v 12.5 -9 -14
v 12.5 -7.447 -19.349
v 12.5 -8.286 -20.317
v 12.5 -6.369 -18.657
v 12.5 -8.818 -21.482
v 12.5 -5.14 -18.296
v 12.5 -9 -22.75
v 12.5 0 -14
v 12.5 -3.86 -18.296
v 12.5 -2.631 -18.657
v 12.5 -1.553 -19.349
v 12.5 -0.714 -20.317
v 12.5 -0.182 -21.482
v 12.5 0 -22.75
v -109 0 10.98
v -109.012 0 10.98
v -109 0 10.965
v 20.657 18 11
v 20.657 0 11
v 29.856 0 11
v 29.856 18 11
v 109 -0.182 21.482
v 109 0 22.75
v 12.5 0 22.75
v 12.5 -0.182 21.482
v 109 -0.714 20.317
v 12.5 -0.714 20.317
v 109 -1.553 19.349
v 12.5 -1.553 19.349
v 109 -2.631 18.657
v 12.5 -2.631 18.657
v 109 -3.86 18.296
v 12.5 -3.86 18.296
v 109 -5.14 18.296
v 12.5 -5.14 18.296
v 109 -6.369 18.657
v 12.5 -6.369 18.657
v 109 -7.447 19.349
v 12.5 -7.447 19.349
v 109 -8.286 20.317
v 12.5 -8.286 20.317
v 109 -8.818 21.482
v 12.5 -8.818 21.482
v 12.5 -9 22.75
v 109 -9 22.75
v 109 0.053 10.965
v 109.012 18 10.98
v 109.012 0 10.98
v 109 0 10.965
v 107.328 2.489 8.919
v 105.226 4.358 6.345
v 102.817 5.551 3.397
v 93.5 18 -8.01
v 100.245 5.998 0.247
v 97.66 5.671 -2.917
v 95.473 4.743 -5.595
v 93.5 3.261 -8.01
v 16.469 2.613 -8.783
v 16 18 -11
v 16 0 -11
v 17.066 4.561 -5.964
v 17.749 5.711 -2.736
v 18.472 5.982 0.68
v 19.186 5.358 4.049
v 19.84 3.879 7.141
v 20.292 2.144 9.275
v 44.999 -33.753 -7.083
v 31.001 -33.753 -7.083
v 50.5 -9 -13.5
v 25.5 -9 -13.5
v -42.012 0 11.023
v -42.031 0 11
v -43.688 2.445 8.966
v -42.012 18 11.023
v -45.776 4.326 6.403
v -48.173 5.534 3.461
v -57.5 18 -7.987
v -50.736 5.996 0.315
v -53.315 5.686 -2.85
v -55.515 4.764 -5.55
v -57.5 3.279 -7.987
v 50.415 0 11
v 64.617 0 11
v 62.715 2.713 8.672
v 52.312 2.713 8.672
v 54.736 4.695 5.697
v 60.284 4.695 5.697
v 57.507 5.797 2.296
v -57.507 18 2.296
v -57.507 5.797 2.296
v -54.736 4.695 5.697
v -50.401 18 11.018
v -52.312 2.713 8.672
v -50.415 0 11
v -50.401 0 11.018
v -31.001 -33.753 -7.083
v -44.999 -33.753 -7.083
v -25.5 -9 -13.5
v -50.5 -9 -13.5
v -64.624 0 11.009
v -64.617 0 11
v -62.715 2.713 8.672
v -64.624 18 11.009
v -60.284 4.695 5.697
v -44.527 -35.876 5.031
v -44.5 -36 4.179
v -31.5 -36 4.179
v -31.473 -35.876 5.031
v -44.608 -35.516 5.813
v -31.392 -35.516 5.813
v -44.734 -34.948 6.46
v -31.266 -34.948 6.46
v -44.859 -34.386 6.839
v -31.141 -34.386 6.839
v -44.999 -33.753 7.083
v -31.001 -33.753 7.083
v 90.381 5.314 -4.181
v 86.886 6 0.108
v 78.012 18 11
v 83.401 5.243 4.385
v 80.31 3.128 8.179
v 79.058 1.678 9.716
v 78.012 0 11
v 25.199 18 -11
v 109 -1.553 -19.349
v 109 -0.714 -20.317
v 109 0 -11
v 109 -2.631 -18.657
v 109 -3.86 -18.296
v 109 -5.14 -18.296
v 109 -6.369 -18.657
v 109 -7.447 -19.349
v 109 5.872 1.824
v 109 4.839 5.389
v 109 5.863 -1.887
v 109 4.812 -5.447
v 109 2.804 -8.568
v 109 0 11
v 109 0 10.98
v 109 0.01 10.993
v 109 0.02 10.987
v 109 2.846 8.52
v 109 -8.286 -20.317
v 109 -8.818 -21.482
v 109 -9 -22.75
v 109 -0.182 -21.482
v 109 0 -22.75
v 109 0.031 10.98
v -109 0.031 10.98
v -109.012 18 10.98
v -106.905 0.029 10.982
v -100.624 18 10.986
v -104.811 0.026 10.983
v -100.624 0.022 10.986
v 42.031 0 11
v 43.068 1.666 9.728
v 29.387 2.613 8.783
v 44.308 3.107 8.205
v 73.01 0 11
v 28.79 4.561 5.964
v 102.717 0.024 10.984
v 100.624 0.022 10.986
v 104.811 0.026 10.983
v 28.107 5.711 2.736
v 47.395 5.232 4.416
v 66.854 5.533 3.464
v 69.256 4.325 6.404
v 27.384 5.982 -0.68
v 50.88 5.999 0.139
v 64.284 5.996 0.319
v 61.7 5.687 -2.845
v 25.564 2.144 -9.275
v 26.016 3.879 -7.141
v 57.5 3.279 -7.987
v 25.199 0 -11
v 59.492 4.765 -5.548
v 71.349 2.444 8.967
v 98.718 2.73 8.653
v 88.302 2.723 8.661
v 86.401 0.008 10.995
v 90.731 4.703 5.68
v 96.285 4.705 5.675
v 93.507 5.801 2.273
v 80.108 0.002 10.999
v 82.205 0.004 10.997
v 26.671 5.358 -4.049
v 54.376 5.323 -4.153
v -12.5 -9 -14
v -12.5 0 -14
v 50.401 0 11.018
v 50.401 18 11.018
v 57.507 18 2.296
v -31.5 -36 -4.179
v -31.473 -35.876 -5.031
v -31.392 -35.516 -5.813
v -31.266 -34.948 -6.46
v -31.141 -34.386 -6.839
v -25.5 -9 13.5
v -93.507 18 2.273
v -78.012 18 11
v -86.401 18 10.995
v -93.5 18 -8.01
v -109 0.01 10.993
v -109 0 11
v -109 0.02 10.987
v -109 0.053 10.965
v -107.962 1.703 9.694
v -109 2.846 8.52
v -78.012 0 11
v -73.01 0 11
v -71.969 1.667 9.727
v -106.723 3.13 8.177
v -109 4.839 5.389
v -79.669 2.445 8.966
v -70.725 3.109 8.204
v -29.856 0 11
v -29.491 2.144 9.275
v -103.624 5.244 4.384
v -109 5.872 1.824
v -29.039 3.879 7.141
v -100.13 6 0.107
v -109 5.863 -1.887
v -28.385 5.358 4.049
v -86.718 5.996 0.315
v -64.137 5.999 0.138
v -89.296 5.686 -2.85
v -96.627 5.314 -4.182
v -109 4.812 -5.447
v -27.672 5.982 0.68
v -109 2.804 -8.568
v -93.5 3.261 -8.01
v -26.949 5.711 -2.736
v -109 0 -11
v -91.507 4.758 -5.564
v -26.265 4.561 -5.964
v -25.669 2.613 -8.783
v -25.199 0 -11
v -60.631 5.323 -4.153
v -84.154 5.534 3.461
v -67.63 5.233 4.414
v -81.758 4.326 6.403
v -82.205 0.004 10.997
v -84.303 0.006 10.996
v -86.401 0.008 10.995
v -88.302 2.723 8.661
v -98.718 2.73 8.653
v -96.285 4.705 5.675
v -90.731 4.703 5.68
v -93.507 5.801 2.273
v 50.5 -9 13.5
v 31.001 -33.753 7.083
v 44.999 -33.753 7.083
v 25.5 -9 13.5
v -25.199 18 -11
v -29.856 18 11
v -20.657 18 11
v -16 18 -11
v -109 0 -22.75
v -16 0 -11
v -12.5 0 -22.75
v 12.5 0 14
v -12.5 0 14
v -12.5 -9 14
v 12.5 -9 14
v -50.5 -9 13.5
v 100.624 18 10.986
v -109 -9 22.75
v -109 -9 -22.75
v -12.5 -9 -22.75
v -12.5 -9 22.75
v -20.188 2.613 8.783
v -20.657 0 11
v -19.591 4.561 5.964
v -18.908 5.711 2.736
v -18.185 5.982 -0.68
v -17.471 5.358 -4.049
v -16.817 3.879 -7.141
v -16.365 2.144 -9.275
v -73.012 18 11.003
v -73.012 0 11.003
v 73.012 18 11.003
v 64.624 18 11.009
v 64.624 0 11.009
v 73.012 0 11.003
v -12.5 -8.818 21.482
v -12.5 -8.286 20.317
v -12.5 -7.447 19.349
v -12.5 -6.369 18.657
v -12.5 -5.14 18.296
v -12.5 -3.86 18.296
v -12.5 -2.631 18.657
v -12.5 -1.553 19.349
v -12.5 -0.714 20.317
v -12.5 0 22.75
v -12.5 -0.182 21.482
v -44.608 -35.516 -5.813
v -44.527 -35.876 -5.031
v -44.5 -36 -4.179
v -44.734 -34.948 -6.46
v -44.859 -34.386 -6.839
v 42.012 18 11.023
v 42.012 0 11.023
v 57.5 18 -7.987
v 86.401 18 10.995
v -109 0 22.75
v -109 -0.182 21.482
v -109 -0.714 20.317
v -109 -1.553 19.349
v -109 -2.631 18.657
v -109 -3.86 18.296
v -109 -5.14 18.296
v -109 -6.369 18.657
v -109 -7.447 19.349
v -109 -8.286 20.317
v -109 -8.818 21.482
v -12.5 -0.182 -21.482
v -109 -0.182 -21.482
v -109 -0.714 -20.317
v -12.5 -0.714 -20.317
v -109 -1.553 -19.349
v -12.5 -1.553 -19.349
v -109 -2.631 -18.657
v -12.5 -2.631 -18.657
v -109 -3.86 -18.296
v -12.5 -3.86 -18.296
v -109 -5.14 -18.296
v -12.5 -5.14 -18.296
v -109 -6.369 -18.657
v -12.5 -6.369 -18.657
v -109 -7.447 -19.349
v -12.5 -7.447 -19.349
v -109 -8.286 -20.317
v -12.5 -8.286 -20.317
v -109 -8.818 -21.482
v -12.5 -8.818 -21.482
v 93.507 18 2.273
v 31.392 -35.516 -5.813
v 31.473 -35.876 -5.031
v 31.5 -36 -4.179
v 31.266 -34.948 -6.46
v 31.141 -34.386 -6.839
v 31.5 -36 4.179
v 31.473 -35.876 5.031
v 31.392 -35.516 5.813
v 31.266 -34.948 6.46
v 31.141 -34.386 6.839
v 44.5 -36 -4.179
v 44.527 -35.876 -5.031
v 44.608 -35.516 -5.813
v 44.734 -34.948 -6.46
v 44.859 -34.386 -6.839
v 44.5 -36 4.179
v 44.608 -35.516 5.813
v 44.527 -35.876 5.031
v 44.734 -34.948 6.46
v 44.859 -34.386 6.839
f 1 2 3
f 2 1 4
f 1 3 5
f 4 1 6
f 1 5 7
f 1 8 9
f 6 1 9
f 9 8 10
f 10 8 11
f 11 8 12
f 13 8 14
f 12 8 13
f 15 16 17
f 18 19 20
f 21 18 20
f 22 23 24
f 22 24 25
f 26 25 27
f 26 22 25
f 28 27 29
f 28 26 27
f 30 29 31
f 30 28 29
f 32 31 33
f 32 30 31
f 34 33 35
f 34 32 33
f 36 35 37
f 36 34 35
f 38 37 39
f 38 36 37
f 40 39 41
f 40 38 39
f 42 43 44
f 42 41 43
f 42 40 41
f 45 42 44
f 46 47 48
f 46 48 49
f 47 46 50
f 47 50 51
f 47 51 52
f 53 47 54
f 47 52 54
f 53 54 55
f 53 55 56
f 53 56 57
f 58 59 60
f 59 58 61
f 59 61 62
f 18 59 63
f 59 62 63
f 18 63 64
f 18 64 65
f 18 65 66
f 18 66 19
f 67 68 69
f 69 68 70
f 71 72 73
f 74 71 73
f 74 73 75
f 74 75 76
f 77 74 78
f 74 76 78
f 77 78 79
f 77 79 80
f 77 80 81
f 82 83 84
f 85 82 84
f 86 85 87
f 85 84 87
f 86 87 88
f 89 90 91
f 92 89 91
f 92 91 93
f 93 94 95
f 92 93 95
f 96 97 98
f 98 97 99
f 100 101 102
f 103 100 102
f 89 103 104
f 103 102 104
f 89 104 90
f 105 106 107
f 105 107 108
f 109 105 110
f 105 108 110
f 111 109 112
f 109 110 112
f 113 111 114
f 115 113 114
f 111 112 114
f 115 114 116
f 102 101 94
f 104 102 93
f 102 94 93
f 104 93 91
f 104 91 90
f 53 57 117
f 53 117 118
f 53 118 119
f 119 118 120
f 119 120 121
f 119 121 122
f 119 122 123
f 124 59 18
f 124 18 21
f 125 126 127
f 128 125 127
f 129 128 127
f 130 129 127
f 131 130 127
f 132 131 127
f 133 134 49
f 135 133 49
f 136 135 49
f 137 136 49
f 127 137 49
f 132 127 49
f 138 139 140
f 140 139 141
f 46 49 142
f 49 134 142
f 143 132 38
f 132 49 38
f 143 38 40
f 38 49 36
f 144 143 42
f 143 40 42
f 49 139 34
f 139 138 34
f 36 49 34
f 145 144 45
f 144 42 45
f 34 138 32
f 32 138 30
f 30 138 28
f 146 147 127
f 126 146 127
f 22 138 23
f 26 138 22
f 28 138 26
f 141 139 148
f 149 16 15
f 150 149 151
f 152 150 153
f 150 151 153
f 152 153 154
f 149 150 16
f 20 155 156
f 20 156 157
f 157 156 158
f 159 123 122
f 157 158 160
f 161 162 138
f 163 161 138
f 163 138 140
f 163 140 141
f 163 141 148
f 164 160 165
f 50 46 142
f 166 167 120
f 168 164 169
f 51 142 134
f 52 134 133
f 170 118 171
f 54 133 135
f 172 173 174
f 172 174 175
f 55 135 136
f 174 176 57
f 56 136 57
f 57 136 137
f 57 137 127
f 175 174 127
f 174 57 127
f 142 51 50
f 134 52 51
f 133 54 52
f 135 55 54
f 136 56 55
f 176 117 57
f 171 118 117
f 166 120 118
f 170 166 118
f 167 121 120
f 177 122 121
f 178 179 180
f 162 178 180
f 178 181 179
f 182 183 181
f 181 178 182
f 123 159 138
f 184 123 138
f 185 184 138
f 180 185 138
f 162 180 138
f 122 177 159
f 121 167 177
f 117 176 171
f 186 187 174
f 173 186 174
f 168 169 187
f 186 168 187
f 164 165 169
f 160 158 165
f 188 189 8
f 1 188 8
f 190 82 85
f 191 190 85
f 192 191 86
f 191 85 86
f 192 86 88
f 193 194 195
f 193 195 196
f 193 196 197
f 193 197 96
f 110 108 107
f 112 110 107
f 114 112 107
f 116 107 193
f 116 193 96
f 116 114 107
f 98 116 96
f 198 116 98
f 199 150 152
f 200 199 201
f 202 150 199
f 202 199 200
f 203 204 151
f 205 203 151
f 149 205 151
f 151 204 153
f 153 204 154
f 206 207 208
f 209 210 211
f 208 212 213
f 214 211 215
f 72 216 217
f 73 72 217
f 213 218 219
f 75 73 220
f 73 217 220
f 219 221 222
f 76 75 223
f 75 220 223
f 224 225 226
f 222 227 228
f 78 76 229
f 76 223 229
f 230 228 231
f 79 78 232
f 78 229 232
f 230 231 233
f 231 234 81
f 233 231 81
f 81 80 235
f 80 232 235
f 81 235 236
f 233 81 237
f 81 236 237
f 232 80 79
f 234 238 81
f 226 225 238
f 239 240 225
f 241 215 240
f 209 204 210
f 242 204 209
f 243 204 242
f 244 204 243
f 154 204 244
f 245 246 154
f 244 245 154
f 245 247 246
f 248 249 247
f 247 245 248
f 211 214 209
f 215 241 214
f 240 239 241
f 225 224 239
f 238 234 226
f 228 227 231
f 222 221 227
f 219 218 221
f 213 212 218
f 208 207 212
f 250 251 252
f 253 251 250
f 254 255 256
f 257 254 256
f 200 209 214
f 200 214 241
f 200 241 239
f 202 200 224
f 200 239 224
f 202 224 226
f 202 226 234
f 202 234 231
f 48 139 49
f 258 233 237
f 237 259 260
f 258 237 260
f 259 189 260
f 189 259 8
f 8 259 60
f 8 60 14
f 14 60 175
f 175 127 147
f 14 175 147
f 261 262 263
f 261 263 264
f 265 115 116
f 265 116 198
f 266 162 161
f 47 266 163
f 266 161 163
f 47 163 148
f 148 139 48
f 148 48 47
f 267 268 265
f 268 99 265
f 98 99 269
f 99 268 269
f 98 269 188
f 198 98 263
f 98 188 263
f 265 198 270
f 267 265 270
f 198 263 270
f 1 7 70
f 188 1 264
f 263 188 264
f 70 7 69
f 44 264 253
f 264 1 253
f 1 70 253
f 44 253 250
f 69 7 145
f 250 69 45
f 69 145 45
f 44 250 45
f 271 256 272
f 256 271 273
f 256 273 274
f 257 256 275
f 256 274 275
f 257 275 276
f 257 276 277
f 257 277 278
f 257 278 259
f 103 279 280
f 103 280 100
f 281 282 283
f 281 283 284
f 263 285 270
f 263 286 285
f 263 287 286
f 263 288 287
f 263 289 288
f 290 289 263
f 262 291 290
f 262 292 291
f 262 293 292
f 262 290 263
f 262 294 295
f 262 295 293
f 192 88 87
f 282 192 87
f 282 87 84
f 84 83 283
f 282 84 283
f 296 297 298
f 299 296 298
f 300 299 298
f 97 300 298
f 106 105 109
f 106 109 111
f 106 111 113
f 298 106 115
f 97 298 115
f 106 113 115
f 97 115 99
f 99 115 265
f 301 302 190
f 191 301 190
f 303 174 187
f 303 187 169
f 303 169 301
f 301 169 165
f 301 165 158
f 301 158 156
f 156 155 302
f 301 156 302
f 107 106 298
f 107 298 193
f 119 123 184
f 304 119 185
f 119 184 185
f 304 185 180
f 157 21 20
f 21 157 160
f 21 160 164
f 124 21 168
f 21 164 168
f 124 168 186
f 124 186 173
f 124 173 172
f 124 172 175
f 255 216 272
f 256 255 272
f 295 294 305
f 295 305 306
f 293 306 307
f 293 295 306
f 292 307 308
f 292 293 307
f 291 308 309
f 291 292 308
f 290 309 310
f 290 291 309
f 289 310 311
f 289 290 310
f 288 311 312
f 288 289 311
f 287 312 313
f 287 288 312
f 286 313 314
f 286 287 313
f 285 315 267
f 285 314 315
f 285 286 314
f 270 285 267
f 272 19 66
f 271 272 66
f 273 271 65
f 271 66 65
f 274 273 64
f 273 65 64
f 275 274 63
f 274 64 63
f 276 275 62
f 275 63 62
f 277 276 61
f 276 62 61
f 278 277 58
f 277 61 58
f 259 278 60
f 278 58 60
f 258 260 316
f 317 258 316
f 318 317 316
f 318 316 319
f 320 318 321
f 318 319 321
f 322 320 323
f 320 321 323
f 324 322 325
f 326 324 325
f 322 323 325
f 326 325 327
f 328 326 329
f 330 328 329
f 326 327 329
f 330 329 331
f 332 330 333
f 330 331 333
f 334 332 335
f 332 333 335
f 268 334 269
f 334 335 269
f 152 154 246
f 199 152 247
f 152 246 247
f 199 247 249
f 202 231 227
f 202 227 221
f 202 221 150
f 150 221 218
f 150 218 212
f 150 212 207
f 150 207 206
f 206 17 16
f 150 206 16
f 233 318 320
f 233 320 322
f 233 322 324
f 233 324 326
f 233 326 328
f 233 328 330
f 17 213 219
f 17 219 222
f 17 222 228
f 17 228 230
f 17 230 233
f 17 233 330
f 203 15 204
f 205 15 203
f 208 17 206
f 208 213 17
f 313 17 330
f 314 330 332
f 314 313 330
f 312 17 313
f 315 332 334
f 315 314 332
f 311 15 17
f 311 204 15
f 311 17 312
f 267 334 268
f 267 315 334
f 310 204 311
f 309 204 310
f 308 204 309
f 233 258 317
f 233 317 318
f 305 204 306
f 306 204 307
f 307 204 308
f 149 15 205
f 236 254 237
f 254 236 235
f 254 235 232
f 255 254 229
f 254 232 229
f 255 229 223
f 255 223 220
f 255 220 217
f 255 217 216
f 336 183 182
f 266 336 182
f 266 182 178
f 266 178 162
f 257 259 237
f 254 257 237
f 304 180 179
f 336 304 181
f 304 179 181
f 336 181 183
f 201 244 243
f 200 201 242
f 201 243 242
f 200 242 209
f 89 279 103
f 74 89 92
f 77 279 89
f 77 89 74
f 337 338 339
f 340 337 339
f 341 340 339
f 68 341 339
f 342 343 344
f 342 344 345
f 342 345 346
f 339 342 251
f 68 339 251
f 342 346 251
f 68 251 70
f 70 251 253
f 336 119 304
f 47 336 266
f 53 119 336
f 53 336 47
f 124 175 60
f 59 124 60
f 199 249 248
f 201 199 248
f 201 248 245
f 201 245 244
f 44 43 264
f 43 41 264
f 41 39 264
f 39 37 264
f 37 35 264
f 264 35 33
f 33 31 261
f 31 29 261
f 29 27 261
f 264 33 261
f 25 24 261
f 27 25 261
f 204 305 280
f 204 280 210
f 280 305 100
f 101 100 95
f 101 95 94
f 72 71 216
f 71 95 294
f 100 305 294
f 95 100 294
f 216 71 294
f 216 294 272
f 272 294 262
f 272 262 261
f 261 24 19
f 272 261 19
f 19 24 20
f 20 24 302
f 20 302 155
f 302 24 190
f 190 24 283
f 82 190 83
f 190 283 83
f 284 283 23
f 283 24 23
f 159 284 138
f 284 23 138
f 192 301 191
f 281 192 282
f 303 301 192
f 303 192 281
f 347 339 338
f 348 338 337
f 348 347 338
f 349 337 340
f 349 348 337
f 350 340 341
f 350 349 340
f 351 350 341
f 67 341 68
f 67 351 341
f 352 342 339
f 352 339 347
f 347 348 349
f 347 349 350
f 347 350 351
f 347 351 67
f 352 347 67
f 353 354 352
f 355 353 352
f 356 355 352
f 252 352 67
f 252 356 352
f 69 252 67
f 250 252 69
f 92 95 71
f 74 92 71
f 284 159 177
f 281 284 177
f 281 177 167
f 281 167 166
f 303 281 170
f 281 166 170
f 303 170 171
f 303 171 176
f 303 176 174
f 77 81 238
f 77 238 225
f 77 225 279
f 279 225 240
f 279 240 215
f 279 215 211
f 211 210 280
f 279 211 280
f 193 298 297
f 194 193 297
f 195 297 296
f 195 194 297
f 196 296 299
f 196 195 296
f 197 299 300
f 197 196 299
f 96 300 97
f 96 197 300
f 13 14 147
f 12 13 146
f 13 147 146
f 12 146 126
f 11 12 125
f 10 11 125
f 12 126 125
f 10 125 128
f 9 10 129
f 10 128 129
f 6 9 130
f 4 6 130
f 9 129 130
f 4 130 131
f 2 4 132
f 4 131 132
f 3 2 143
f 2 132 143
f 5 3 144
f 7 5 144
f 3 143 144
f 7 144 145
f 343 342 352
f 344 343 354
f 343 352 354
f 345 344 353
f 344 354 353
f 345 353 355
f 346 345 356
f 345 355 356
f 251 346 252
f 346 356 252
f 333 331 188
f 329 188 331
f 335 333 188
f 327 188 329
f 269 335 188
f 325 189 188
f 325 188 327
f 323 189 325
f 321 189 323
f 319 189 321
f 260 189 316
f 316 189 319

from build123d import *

# Parameters (mm, degrees)
EXTRUDE_1_DEPTH     = 109
EXTRUDE_2_DEPTH     = 18
SKETCH_3_W          = 25
SKETCH_3_H          = 11.25
CUT_EXTRUDE_1_DEPTH = 18
SKETCH_4_W          = 25
SKETCH_4_H          = 27
EXTRUDE_3_DEPTH     = 27
CUT_EXTRUDE_2_DEPTH = 122.166018853
CUT_EXTRUDE_3_DEPTH = 166.462013552
FILLET_1_R          = 3
CUT_EXTRUDE_4_DEPTH = 223.40244064


# Read off the part's stored shape, not the designer's step: Бобышка-Вытянуть2
with BuildPart() as part:
    # Эскиз1 → Бобышка-Вытянуть1 (new, symmetric)
    with BuildSketch(Plane(origin=(0, 0, 0), x_dir=(0, 0, -1), z_dir=(1, 0, 0))):
        with BuildLine():
            Line((11, 0), (25.25, 0))
            Line((25.25, 0), (25.25, -9))
            Line((25.25, -9), (-25.25, -9))
            Line((-25.25, -9), (-25.25, 0))
            Line((-25.25, 0), (-11, 0))
            ThreePointArc((-11, 0), (0, 6), (11, 0))
        make_face()
    extrude(amount=EXTRUDE_1_DEPTH, both=True)

    # Бобышка-Вытянуть2 outline → Бобышка-Вытянуть2 (add)
    with BuildSketch(Plane(origin=(0, 0, 0), x_dir=(1, 0, 0), z_dir=(0, 1, 0))):
        Polygon((16, 11), (20.656976684, -11), (29.856406461, -11), (25.199429777, 11), align=None)
        Polygon((-29.856406461, -11), (-20.656976684, -11), (-16, 11), (-25.199429777, 11), align=None)
        Polygon((78.012123179, -10.999996132), (86.400679256, -10.994643711), (93.506557878, -2.272856192), (100.623560797, -10.985568626), (109.012116871, -10.980216204), (93.499996845, 8.009889964), align=None)
        Polygon((64.623554487, -11.008538874), (73.012110561, -11.003186452), (57.499990534, 7.986919716), (42.012116871, -11.02296638), (50.400672946, -11.017613959), (57.506551567, -2.29582644), align=None)
        Polygon((-109.012116871, -10.980216204), (-100.623560797, -10.985568626), (-93.506557878, -2.272856192), (-86.400679256, -10.994643711), (-78.012123179, -10.999996132), (-93.499996845, 8.009889964), align=None)
        Polygon((-73.012110561, -11.003186452), (-64.623554487, -11.008538874), (-57.506551567, -2.29582644), (-50.400672946, -11.017613959), (-42.012116871, -11.02296638), (-57.499990534, 7.986919716), align=None)
    extrude(amount=EXTRUDE_2_DEPTH)

    # Эскиз3 → Вырез-Вытянуть1 (cut)
    with BuildSketch(Plane(origin=(0, 0, 0), x_dir=(1, 0, 0), z_dir=(0, 1, 0))):
        with Locations((0, 19.625)):
            Rectangle(SKETCH_3_W, SKETCH_3_H)
        with Locations((0, -19.625)):
            Rectangle(SKETCH_3_W, SKETCH_3_H)
    extrude(amount=-CUT_EXTRUDE_1_DEPTH, mode=Mode.SUBTRACT)

    # Эскиз4 → Бобышка-Вытянуть3 (add)
    with BuildSketch(Plane.XZ.offset(9)):
        with Locations((38, 0)):
            Rectangle(SKETCH_4_W, SKETCH_4_H)
        with Locations((-38, 0)):
            Rectangle(SKETCH_4_W, SKETCH_4_H)
    extrude(amount=EXTRUDE_3_DEPTH)

    # Эскиз6 → Вырез-Вытянуть2 (cut, through all)
    with BuildSketch(Plane.XY.offset(13.5)):
        Polygon((-50.5, -9), (-50.5, -36), (-44.5, -36), align=None)
        Polygon((-25.5, -36), (-31.5, -36), (-25.5, -9), align=None)
        Polygon((25.5, -9), (25.5, -36), (31.5, -36), align=None)
        Polygon((50.5, -36), (44.5, -36), (50.5, -9), align=None)
    extrude(amount=-CUT_EXTRUDE_2_DEPTH, mode=Mode.SUBTRACT)

    # Эскиз5 → Вырез-Вытянуть3 (cut, through all)
    with BuildSketch(Plane.ZY.offset(50.5)):
        Polygon((-13.5, -9), (-13.5, -36), (-6.5, -36), align=None)
        Polygon((13.5, -36), (6.5, -36), (13.5, -9), align=None)
    extrude(amount=-CUT_EXTRUDE_3_DEPTH, mode=Mode.SUBTRACT)

    # Скругление1
    fillet_1_edges = [part.edges().sort_by_distance(p)[0] for p in [
        (-38, -36, -6.5),
        (38, -36, -6.5),
        (-38, -36, 6.5),
        (38, -36, 6.5),
    ]]
    fillet(fillet_1_edges, radius=FILLET_1_R)

    # Эскиз8 → Вырез-Вытянуть4 (cut, through all)
    with BuildSketch(Plane(origin=(109, 0, 0), x_dir=(0, 0, -1), z_dir=(1, 0, 0))):
        with BuildLine():
            Line((-22.75, -9), (-25.25, -9))
            Line((-25.25, -9), (-25.25, 0))
            Line((-25.25, 0), (-22.75, 0))
            ThreePointArc((-22.75, 0), (-18.25, -4.5), (-22.75, -9))
        make_face()
        with BuildLine():
            Line((22.75, -9), (25.25, -9))
            Line((25.25, -9), (25.25, 0))
            Line((25.25, 0), (22.75, 0))
            ThreePointArc((22.75, 0), (18.25, -4.5), (22.75, -9))
        make_face()
    extrude(amount=-CUT_EXTRUDE_4_DEPTH, mode=Mode.SUBTRACT)


solid = part.part
